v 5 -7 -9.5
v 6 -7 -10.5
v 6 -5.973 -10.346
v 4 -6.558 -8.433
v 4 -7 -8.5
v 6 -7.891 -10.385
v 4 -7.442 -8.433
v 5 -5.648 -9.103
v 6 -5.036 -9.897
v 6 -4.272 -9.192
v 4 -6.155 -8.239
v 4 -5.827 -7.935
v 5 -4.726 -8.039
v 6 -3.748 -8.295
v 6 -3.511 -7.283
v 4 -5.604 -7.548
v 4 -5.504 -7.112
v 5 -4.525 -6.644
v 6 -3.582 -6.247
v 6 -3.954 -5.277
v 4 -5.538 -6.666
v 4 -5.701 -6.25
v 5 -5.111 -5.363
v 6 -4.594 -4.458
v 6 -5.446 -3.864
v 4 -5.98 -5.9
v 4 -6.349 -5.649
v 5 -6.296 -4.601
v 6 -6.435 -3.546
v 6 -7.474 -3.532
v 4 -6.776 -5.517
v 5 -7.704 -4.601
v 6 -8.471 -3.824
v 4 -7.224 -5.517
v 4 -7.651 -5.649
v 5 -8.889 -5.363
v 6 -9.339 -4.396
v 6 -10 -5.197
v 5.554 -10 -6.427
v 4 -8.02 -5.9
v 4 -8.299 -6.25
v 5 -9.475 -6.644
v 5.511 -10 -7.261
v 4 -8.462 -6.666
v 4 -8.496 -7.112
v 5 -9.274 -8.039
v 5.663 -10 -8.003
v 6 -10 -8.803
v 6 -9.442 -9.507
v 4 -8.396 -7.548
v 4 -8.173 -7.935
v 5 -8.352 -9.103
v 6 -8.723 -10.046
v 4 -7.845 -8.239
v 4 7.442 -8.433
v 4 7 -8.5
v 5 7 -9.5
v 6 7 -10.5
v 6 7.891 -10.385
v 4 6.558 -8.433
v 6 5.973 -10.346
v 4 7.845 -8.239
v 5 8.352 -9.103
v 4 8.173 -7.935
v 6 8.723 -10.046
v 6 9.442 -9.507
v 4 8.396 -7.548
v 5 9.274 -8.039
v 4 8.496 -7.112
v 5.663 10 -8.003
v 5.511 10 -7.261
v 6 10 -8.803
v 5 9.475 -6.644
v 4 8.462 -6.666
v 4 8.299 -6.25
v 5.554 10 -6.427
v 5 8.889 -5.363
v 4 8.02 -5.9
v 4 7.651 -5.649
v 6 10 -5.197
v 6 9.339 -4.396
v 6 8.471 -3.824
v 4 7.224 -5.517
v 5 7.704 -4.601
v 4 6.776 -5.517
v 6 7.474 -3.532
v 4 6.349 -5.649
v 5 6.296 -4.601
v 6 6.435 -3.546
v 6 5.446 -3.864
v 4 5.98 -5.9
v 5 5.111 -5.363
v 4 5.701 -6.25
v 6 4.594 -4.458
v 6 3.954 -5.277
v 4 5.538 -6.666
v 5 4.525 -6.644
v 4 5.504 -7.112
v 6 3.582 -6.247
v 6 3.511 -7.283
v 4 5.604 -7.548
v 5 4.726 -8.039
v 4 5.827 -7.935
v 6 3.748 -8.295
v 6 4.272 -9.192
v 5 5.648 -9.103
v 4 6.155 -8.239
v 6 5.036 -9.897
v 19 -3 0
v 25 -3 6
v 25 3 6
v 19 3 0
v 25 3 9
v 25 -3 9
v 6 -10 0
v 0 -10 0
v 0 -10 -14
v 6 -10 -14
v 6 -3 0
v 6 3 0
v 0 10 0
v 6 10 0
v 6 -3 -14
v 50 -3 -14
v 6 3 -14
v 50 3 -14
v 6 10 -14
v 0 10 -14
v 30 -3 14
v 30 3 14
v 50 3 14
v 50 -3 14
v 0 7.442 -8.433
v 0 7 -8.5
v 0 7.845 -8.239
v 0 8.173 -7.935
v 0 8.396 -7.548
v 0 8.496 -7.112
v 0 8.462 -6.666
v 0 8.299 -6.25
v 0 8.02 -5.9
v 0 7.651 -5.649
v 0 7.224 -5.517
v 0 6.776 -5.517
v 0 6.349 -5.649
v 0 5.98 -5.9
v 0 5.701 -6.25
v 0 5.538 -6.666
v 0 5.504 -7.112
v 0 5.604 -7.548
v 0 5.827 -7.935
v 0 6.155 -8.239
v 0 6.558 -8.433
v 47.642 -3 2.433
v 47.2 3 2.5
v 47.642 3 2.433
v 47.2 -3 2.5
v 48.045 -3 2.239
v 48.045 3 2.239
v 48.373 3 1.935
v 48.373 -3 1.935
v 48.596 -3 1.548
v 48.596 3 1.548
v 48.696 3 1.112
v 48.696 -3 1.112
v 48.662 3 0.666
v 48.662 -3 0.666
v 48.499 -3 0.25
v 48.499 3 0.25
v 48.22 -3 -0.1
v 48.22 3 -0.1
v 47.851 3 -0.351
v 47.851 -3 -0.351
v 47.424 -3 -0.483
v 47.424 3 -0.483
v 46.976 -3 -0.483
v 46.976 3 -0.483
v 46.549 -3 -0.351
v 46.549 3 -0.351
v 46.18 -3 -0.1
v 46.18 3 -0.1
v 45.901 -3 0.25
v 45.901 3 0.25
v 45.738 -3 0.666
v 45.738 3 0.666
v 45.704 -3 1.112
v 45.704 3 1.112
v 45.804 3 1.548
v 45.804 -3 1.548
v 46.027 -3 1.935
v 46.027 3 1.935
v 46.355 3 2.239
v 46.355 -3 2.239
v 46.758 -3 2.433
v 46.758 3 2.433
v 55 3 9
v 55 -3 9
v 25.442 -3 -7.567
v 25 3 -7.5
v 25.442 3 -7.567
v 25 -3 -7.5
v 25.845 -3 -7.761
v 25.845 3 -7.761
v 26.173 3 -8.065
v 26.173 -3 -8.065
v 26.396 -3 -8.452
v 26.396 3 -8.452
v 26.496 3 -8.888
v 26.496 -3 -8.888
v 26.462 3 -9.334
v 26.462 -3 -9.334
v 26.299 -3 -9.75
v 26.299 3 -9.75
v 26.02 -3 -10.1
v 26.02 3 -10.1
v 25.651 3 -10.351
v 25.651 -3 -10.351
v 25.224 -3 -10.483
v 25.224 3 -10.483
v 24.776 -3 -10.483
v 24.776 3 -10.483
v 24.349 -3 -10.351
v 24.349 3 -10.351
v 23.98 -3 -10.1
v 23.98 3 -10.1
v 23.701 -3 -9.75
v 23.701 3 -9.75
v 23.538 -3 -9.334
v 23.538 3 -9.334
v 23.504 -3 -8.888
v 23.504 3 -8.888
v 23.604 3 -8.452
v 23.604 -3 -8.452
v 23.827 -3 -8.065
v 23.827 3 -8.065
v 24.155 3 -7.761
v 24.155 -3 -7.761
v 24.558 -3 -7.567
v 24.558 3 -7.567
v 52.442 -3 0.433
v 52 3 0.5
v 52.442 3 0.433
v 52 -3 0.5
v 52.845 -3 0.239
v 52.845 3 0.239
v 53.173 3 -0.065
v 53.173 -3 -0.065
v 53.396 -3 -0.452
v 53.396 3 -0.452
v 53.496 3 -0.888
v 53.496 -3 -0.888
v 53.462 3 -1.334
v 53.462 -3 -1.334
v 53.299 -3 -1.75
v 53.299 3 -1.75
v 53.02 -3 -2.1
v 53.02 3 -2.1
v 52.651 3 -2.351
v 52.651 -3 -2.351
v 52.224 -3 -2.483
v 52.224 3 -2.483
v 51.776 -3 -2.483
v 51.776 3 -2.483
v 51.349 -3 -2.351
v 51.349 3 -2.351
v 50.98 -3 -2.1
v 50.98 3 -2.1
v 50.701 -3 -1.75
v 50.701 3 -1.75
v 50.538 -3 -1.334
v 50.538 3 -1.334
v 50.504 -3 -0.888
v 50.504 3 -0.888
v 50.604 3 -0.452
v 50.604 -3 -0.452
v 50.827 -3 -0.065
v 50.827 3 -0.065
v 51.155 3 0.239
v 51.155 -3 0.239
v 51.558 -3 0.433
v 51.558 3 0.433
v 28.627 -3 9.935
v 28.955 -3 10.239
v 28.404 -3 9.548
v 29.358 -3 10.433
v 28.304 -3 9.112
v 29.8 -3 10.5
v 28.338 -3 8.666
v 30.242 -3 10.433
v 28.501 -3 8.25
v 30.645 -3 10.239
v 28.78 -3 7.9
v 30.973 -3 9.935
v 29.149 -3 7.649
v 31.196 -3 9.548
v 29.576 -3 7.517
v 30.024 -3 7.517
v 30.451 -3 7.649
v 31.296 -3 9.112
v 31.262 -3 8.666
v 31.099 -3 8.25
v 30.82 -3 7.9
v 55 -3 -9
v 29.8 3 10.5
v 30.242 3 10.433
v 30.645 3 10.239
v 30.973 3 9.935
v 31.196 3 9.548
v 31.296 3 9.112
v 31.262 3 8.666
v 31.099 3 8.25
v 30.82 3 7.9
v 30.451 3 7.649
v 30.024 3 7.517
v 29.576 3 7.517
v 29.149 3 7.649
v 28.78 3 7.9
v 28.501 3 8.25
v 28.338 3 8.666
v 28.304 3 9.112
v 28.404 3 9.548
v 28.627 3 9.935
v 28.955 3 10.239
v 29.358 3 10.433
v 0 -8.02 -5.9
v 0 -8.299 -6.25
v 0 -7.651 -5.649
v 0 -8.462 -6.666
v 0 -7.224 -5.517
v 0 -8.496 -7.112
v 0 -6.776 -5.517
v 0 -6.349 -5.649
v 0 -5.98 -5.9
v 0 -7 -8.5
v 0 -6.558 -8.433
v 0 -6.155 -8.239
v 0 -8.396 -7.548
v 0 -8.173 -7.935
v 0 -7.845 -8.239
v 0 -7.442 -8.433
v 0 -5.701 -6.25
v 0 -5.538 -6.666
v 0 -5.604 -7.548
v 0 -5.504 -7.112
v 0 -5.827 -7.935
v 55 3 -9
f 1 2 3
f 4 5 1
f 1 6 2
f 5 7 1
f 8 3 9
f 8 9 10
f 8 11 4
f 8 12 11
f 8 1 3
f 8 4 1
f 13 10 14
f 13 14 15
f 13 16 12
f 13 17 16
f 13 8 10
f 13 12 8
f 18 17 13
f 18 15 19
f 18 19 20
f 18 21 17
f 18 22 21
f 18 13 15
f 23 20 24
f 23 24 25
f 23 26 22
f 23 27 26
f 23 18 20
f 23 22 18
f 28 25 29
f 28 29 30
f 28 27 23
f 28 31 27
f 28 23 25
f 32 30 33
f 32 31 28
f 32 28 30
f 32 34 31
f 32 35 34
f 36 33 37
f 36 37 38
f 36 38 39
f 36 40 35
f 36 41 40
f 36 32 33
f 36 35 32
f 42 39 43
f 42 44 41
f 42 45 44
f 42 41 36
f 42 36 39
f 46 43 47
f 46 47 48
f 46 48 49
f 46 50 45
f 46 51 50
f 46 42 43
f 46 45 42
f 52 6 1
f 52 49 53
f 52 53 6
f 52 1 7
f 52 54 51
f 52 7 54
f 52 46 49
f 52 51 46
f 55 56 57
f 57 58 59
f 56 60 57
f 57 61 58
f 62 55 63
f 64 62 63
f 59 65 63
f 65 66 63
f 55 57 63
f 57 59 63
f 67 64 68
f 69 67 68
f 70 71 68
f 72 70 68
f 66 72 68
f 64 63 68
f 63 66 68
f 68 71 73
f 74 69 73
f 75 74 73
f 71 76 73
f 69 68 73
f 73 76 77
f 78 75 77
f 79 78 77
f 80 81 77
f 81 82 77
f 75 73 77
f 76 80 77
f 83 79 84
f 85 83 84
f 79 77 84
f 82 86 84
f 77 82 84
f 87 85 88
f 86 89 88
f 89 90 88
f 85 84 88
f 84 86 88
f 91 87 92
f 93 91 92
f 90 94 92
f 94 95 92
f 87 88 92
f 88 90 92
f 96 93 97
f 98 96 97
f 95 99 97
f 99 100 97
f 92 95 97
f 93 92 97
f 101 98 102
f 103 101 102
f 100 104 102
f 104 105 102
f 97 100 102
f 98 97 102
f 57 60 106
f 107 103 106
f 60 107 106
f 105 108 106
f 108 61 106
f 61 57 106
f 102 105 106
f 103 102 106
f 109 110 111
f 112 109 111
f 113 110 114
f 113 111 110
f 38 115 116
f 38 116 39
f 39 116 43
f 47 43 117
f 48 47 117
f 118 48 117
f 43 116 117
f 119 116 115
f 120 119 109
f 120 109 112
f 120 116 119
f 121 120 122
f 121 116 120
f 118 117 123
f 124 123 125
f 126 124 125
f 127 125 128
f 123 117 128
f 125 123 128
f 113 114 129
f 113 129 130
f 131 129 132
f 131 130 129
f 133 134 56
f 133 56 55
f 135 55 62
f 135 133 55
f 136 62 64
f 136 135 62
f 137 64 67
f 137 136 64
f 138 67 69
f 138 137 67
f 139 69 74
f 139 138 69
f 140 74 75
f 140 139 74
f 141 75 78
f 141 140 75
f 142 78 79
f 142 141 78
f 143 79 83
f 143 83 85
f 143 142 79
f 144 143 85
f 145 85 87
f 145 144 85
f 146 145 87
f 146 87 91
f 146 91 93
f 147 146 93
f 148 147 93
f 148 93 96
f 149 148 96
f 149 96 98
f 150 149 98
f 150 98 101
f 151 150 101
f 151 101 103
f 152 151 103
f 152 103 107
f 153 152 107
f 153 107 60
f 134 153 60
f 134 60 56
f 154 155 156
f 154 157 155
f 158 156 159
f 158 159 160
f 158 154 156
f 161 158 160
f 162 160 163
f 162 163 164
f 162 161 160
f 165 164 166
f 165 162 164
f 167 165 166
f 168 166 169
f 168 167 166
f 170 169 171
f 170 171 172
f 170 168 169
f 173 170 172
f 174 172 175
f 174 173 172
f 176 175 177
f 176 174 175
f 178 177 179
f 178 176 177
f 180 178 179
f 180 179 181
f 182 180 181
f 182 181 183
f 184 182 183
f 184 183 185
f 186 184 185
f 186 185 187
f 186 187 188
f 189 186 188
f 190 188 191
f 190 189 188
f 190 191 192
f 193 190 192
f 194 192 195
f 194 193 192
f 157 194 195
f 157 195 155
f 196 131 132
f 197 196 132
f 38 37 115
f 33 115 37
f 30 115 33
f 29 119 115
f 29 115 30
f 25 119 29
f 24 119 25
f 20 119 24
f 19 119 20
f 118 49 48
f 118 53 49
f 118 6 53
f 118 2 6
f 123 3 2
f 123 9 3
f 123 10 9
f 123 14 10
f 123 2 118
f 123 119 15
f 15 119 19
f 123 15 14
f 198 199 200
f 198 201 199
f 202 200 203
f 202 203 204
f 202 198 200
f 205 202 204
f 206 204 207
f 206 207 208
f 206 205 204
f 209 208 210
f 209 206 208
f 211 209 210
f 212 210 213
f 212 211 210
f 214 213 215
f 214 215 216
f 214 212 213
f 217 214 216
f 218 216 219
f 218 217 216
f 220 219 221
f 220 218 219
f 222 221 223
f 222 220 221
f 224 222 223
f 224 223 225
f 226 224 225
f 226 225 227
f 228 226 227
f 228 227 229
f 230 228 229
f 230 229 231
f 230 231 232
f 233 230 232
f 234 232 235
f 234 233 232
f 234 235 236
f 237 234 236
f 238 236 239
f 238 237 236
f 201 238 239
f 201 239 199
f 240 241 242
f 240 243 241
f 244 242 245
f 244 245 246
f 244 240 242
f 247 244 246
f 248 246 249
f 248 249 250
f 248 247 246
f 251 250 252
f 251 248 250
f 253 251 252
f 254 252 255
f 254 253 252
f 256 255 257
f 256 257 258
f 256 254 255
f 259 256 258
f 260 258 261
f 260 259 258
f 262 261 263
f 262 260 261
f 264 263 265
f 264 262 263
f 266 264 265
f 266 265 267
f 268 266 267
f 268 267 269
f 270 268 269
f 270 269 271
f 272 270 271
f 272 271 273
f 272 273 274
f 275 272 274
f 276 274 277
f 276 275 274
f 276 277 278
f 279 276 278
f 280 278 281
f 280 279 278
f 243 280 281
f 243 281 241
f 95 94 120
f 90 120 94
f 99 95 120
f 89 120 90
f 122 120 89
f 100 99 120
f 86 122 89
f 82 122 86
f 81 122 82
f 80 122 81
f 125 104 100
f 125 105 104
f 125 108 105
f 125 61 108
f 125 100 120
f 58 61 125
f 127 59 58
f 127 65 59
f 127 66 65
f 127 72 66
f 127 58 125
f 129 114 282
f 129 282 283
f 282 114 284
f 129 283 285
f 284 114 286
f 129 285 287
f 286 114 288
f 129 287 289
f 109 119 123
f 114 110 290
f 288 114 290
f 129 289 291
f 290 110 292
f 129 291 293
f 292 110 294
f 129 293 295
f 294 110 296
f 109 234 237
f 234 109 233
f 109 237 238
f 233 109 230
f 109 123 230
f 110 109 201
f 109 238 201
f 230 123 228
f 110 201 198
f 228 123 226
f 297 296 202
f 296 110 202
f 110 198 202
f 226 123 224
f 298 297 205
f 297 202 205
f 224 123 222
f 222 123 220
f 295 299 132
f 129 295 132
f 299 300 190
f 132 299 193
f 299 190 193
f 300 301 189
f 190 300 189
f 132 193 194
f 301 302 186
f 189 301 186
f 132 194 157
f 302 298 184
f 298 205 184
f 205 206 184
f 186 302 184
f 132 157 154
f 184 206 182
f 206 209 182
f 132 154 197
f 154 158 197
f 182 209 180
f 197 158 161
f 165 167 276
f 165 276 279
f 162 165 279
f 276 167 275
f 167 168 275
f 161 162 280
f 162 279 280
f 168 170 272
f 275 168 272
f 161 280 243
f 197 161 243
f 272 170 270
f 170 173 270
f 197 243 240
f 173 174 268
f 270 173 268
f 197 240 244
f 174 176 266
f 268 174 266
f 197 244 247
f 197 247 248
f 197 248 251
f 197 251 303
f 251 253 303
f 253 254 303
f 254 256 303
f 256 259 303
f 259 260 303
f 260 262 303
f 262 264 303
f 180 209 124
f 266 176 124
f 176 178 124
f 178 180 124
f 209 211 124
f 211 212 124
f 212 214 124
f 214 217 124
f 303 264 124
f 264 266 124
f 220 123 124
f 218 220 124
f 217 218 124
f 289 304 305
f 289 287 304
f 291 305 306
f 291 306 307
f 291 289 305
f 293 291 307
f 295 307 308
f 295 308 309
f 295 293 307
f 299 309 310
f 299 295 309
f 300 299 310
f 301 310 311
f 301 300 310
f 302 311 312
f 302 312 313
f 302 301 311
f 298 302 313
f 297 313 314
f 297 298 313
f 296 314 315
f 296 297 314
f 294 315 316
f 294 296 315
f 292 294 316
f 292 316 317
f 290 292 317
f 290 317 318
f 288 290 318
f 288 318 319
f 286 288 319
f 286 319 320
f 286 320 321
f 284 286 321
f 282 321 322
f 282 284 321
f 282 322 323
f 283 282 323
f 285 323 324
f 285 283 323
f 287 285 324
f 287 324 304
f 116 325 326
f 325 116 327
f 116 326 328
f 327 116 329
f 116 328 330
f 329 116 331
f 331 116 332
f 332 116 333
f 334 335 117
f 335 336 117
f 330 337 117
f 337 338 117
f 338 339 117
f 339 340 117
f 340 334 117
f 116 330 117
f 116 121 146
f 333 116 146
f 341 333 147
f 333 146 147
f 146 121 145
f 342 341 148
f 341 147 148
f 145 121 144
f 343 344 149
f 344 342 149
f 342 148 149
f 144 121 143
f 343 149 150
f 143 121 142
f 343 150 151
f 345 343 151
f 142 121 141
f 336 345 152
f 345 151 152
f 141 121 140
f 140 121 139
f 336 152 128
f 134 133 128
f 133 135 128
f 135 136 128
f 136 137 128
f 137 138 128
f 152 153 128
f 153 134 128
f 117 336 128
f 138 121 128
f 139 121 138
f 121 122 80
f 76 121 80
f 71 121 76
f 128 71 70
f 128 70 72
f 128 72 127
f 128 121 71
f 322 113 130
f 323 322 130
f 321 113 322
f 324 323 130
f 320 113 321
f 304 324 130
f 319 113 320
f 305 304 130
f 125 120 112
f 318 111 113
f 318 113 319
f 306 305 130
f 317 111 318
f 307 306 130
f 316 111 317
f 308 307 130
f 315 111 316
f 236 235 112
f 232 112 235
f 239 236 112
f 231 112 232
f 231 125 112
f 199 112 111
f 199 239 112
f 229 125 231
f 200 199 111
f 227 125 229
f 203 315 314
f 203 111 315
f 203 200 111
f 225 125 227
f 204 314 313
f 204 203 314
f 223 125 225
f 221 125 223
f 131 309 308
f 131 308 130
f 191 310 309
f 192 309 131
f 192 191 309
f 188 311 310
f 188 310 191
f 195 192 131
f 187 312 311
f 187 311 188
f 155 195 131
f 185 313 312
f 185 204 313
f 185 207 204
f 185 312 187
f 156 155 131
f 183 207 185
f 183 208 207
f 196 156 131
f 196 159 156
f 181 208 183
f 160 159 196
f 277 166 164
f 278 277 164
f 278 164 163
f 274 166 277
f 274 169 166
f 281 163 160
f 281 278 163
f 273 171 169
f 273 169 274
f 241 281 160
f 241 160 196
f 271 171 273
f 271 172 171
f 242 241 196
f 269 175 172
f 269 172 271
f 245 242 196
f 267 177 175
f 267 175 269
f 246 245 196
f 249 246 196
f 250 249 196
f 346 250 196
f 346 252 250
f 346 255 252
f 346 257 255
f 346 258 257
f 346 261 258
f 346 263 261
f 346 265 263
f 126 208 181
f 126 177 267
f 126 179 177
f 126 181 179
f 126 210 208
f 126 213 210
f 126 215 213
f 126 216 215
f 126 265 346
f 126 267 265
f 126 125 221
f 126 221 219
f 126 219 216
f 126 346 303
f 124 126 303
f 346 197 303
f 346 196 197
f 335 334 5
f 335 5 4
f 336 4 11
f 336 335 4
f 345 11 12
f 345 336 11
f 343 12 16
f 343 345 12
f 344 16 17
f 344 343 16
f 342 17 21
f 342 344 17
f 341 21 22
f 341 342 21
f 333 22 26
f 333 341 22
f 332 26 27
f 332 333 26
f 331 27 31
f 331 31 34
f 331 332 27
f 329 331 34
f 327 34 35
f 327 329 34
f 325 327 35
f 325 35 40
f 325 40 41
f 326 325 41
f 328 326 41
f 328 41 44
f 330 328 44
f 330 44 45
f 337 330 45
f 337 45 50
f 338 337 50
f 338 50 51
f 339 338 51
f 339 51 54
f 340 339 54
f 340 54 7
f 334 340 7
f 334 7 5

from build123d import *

# Parameters (mm, degrees)
SKETCH_1_R      = 1.5
EXTRUDE_1_DEPTH = 3
SKETCH_2_W      = 14
SKETCH_2_H      = 20
SKETCH_2_R      = 1.5
EXTRUDE_2_DEPTH = 6
CHAMFER_1_SIZE  = 2
CHAMFER_2_SIZE  = 6
CHAMFER_3_SIZE  = 5


with BuildPart() as part:
    # 草图1 → 凸台-拉伸1 (new, symmetric)
    with BuildSketch(Plane(origin=(0, 0, 0), x_dir=(1, 0, 0), z_dir=(0, 1, 0))):
        Polygon((0, 14), (0, 0), (25, 0), (25, -14), (55, -14), (55, 14), align=None)
        with Locations(Location((25, 9, 0), (0, 0, 270))):
            Circle(SKETCH_1_R, mode=Mode.SUBTRACT)
        with Locations(Location((52, 1, 0), (0, 0, 270))):
            Circle(SKETCH_1_R, mode=Mode.SUBTRACT)
        with Locations(Location((29.8, -9, 0), (0, 0, 270))):
            Circle(SKETCH_1_R, mode=Mode.SUBTRACT)
        with Locations(Location((47.2, -1, 0), (0, 0, 270))):
            Circle(SKETCH_1_R, mode=Mode.SUBTRACT)
    extrude(amount=EXTRUDE_1_DEPTH, both=True)

    # 草图2 → 凸台-拉伸2 (add)
    with BuildSketch(Plane(origin=(0, 0, 0), x_dir=(0, 0, -1), z_dir=(1, 0, 0))):
        with Locations((7, 0)):
            Rectangle(SKETCH_2_W, SKETCH_2_H)
        with Locations((7, 7)):
            Circle(SKETCH_2_R, mode=Mode.SUBTRACT)
        with Locations((7, -7)):
            Circle(SKETCH_2_R, mode=Mode.SUBTRACT)
    extrude(amount=EXTRUDE_2_DEPTH)

    # 倒角1
    # the kernel refuses this chamfer: 2 mm, written as the material it takes off along each edge
    with BuildSketch(Plane(origin=(6, 7, -7), x_dir=(0, 0, -1), z_dir=(0, -1, 0))) as chamfer_1_piece_1:
        Polygon((1.5, -CHAMFER_1_SIZE), (1.5 + CHAMFER_1_SIZE, 0), (1.5, 0), align=None)
    revolve(axis=Axis((6, 7, -7), (1, 0, 0)), mode=Mode.SUBTRACT)
    with BuildSketch(Plane(origin=(6, -7, -7), x_dir=(0, 0, -1), z_dir=(0, -1, 0))) as chamfer_1_piece_2:
        Polygon((1.5 + CHAMFER_1_SIZE, 0), (1.5, -CHAMFER_1_SIZE), (1.5, 0), align=None)
    revolve(axis=Axis((6, -7, -7), (1, 0, 0)), mode=Mode.SUBTRACT)

    # 倒角2
    chamfer_2_edges = [part.edges().sort_by_distance(p)[0] for p in [
        (25, 0, 0),
    ]]
    chamfer(chamfer_2_edges, length=CHAMFER_2_SIZE)

    # 倒角3
    chamfer_3_edges = [part.edges().sort_by_distance(p)[0] for p in [
        (55, 0, -14),
        (55, 0, 14),
        (25, 0, 14),
    ]]
    chamfer(chamfer_3_edges, length=CHAMFER_3_SIZE)


solid = part.part
